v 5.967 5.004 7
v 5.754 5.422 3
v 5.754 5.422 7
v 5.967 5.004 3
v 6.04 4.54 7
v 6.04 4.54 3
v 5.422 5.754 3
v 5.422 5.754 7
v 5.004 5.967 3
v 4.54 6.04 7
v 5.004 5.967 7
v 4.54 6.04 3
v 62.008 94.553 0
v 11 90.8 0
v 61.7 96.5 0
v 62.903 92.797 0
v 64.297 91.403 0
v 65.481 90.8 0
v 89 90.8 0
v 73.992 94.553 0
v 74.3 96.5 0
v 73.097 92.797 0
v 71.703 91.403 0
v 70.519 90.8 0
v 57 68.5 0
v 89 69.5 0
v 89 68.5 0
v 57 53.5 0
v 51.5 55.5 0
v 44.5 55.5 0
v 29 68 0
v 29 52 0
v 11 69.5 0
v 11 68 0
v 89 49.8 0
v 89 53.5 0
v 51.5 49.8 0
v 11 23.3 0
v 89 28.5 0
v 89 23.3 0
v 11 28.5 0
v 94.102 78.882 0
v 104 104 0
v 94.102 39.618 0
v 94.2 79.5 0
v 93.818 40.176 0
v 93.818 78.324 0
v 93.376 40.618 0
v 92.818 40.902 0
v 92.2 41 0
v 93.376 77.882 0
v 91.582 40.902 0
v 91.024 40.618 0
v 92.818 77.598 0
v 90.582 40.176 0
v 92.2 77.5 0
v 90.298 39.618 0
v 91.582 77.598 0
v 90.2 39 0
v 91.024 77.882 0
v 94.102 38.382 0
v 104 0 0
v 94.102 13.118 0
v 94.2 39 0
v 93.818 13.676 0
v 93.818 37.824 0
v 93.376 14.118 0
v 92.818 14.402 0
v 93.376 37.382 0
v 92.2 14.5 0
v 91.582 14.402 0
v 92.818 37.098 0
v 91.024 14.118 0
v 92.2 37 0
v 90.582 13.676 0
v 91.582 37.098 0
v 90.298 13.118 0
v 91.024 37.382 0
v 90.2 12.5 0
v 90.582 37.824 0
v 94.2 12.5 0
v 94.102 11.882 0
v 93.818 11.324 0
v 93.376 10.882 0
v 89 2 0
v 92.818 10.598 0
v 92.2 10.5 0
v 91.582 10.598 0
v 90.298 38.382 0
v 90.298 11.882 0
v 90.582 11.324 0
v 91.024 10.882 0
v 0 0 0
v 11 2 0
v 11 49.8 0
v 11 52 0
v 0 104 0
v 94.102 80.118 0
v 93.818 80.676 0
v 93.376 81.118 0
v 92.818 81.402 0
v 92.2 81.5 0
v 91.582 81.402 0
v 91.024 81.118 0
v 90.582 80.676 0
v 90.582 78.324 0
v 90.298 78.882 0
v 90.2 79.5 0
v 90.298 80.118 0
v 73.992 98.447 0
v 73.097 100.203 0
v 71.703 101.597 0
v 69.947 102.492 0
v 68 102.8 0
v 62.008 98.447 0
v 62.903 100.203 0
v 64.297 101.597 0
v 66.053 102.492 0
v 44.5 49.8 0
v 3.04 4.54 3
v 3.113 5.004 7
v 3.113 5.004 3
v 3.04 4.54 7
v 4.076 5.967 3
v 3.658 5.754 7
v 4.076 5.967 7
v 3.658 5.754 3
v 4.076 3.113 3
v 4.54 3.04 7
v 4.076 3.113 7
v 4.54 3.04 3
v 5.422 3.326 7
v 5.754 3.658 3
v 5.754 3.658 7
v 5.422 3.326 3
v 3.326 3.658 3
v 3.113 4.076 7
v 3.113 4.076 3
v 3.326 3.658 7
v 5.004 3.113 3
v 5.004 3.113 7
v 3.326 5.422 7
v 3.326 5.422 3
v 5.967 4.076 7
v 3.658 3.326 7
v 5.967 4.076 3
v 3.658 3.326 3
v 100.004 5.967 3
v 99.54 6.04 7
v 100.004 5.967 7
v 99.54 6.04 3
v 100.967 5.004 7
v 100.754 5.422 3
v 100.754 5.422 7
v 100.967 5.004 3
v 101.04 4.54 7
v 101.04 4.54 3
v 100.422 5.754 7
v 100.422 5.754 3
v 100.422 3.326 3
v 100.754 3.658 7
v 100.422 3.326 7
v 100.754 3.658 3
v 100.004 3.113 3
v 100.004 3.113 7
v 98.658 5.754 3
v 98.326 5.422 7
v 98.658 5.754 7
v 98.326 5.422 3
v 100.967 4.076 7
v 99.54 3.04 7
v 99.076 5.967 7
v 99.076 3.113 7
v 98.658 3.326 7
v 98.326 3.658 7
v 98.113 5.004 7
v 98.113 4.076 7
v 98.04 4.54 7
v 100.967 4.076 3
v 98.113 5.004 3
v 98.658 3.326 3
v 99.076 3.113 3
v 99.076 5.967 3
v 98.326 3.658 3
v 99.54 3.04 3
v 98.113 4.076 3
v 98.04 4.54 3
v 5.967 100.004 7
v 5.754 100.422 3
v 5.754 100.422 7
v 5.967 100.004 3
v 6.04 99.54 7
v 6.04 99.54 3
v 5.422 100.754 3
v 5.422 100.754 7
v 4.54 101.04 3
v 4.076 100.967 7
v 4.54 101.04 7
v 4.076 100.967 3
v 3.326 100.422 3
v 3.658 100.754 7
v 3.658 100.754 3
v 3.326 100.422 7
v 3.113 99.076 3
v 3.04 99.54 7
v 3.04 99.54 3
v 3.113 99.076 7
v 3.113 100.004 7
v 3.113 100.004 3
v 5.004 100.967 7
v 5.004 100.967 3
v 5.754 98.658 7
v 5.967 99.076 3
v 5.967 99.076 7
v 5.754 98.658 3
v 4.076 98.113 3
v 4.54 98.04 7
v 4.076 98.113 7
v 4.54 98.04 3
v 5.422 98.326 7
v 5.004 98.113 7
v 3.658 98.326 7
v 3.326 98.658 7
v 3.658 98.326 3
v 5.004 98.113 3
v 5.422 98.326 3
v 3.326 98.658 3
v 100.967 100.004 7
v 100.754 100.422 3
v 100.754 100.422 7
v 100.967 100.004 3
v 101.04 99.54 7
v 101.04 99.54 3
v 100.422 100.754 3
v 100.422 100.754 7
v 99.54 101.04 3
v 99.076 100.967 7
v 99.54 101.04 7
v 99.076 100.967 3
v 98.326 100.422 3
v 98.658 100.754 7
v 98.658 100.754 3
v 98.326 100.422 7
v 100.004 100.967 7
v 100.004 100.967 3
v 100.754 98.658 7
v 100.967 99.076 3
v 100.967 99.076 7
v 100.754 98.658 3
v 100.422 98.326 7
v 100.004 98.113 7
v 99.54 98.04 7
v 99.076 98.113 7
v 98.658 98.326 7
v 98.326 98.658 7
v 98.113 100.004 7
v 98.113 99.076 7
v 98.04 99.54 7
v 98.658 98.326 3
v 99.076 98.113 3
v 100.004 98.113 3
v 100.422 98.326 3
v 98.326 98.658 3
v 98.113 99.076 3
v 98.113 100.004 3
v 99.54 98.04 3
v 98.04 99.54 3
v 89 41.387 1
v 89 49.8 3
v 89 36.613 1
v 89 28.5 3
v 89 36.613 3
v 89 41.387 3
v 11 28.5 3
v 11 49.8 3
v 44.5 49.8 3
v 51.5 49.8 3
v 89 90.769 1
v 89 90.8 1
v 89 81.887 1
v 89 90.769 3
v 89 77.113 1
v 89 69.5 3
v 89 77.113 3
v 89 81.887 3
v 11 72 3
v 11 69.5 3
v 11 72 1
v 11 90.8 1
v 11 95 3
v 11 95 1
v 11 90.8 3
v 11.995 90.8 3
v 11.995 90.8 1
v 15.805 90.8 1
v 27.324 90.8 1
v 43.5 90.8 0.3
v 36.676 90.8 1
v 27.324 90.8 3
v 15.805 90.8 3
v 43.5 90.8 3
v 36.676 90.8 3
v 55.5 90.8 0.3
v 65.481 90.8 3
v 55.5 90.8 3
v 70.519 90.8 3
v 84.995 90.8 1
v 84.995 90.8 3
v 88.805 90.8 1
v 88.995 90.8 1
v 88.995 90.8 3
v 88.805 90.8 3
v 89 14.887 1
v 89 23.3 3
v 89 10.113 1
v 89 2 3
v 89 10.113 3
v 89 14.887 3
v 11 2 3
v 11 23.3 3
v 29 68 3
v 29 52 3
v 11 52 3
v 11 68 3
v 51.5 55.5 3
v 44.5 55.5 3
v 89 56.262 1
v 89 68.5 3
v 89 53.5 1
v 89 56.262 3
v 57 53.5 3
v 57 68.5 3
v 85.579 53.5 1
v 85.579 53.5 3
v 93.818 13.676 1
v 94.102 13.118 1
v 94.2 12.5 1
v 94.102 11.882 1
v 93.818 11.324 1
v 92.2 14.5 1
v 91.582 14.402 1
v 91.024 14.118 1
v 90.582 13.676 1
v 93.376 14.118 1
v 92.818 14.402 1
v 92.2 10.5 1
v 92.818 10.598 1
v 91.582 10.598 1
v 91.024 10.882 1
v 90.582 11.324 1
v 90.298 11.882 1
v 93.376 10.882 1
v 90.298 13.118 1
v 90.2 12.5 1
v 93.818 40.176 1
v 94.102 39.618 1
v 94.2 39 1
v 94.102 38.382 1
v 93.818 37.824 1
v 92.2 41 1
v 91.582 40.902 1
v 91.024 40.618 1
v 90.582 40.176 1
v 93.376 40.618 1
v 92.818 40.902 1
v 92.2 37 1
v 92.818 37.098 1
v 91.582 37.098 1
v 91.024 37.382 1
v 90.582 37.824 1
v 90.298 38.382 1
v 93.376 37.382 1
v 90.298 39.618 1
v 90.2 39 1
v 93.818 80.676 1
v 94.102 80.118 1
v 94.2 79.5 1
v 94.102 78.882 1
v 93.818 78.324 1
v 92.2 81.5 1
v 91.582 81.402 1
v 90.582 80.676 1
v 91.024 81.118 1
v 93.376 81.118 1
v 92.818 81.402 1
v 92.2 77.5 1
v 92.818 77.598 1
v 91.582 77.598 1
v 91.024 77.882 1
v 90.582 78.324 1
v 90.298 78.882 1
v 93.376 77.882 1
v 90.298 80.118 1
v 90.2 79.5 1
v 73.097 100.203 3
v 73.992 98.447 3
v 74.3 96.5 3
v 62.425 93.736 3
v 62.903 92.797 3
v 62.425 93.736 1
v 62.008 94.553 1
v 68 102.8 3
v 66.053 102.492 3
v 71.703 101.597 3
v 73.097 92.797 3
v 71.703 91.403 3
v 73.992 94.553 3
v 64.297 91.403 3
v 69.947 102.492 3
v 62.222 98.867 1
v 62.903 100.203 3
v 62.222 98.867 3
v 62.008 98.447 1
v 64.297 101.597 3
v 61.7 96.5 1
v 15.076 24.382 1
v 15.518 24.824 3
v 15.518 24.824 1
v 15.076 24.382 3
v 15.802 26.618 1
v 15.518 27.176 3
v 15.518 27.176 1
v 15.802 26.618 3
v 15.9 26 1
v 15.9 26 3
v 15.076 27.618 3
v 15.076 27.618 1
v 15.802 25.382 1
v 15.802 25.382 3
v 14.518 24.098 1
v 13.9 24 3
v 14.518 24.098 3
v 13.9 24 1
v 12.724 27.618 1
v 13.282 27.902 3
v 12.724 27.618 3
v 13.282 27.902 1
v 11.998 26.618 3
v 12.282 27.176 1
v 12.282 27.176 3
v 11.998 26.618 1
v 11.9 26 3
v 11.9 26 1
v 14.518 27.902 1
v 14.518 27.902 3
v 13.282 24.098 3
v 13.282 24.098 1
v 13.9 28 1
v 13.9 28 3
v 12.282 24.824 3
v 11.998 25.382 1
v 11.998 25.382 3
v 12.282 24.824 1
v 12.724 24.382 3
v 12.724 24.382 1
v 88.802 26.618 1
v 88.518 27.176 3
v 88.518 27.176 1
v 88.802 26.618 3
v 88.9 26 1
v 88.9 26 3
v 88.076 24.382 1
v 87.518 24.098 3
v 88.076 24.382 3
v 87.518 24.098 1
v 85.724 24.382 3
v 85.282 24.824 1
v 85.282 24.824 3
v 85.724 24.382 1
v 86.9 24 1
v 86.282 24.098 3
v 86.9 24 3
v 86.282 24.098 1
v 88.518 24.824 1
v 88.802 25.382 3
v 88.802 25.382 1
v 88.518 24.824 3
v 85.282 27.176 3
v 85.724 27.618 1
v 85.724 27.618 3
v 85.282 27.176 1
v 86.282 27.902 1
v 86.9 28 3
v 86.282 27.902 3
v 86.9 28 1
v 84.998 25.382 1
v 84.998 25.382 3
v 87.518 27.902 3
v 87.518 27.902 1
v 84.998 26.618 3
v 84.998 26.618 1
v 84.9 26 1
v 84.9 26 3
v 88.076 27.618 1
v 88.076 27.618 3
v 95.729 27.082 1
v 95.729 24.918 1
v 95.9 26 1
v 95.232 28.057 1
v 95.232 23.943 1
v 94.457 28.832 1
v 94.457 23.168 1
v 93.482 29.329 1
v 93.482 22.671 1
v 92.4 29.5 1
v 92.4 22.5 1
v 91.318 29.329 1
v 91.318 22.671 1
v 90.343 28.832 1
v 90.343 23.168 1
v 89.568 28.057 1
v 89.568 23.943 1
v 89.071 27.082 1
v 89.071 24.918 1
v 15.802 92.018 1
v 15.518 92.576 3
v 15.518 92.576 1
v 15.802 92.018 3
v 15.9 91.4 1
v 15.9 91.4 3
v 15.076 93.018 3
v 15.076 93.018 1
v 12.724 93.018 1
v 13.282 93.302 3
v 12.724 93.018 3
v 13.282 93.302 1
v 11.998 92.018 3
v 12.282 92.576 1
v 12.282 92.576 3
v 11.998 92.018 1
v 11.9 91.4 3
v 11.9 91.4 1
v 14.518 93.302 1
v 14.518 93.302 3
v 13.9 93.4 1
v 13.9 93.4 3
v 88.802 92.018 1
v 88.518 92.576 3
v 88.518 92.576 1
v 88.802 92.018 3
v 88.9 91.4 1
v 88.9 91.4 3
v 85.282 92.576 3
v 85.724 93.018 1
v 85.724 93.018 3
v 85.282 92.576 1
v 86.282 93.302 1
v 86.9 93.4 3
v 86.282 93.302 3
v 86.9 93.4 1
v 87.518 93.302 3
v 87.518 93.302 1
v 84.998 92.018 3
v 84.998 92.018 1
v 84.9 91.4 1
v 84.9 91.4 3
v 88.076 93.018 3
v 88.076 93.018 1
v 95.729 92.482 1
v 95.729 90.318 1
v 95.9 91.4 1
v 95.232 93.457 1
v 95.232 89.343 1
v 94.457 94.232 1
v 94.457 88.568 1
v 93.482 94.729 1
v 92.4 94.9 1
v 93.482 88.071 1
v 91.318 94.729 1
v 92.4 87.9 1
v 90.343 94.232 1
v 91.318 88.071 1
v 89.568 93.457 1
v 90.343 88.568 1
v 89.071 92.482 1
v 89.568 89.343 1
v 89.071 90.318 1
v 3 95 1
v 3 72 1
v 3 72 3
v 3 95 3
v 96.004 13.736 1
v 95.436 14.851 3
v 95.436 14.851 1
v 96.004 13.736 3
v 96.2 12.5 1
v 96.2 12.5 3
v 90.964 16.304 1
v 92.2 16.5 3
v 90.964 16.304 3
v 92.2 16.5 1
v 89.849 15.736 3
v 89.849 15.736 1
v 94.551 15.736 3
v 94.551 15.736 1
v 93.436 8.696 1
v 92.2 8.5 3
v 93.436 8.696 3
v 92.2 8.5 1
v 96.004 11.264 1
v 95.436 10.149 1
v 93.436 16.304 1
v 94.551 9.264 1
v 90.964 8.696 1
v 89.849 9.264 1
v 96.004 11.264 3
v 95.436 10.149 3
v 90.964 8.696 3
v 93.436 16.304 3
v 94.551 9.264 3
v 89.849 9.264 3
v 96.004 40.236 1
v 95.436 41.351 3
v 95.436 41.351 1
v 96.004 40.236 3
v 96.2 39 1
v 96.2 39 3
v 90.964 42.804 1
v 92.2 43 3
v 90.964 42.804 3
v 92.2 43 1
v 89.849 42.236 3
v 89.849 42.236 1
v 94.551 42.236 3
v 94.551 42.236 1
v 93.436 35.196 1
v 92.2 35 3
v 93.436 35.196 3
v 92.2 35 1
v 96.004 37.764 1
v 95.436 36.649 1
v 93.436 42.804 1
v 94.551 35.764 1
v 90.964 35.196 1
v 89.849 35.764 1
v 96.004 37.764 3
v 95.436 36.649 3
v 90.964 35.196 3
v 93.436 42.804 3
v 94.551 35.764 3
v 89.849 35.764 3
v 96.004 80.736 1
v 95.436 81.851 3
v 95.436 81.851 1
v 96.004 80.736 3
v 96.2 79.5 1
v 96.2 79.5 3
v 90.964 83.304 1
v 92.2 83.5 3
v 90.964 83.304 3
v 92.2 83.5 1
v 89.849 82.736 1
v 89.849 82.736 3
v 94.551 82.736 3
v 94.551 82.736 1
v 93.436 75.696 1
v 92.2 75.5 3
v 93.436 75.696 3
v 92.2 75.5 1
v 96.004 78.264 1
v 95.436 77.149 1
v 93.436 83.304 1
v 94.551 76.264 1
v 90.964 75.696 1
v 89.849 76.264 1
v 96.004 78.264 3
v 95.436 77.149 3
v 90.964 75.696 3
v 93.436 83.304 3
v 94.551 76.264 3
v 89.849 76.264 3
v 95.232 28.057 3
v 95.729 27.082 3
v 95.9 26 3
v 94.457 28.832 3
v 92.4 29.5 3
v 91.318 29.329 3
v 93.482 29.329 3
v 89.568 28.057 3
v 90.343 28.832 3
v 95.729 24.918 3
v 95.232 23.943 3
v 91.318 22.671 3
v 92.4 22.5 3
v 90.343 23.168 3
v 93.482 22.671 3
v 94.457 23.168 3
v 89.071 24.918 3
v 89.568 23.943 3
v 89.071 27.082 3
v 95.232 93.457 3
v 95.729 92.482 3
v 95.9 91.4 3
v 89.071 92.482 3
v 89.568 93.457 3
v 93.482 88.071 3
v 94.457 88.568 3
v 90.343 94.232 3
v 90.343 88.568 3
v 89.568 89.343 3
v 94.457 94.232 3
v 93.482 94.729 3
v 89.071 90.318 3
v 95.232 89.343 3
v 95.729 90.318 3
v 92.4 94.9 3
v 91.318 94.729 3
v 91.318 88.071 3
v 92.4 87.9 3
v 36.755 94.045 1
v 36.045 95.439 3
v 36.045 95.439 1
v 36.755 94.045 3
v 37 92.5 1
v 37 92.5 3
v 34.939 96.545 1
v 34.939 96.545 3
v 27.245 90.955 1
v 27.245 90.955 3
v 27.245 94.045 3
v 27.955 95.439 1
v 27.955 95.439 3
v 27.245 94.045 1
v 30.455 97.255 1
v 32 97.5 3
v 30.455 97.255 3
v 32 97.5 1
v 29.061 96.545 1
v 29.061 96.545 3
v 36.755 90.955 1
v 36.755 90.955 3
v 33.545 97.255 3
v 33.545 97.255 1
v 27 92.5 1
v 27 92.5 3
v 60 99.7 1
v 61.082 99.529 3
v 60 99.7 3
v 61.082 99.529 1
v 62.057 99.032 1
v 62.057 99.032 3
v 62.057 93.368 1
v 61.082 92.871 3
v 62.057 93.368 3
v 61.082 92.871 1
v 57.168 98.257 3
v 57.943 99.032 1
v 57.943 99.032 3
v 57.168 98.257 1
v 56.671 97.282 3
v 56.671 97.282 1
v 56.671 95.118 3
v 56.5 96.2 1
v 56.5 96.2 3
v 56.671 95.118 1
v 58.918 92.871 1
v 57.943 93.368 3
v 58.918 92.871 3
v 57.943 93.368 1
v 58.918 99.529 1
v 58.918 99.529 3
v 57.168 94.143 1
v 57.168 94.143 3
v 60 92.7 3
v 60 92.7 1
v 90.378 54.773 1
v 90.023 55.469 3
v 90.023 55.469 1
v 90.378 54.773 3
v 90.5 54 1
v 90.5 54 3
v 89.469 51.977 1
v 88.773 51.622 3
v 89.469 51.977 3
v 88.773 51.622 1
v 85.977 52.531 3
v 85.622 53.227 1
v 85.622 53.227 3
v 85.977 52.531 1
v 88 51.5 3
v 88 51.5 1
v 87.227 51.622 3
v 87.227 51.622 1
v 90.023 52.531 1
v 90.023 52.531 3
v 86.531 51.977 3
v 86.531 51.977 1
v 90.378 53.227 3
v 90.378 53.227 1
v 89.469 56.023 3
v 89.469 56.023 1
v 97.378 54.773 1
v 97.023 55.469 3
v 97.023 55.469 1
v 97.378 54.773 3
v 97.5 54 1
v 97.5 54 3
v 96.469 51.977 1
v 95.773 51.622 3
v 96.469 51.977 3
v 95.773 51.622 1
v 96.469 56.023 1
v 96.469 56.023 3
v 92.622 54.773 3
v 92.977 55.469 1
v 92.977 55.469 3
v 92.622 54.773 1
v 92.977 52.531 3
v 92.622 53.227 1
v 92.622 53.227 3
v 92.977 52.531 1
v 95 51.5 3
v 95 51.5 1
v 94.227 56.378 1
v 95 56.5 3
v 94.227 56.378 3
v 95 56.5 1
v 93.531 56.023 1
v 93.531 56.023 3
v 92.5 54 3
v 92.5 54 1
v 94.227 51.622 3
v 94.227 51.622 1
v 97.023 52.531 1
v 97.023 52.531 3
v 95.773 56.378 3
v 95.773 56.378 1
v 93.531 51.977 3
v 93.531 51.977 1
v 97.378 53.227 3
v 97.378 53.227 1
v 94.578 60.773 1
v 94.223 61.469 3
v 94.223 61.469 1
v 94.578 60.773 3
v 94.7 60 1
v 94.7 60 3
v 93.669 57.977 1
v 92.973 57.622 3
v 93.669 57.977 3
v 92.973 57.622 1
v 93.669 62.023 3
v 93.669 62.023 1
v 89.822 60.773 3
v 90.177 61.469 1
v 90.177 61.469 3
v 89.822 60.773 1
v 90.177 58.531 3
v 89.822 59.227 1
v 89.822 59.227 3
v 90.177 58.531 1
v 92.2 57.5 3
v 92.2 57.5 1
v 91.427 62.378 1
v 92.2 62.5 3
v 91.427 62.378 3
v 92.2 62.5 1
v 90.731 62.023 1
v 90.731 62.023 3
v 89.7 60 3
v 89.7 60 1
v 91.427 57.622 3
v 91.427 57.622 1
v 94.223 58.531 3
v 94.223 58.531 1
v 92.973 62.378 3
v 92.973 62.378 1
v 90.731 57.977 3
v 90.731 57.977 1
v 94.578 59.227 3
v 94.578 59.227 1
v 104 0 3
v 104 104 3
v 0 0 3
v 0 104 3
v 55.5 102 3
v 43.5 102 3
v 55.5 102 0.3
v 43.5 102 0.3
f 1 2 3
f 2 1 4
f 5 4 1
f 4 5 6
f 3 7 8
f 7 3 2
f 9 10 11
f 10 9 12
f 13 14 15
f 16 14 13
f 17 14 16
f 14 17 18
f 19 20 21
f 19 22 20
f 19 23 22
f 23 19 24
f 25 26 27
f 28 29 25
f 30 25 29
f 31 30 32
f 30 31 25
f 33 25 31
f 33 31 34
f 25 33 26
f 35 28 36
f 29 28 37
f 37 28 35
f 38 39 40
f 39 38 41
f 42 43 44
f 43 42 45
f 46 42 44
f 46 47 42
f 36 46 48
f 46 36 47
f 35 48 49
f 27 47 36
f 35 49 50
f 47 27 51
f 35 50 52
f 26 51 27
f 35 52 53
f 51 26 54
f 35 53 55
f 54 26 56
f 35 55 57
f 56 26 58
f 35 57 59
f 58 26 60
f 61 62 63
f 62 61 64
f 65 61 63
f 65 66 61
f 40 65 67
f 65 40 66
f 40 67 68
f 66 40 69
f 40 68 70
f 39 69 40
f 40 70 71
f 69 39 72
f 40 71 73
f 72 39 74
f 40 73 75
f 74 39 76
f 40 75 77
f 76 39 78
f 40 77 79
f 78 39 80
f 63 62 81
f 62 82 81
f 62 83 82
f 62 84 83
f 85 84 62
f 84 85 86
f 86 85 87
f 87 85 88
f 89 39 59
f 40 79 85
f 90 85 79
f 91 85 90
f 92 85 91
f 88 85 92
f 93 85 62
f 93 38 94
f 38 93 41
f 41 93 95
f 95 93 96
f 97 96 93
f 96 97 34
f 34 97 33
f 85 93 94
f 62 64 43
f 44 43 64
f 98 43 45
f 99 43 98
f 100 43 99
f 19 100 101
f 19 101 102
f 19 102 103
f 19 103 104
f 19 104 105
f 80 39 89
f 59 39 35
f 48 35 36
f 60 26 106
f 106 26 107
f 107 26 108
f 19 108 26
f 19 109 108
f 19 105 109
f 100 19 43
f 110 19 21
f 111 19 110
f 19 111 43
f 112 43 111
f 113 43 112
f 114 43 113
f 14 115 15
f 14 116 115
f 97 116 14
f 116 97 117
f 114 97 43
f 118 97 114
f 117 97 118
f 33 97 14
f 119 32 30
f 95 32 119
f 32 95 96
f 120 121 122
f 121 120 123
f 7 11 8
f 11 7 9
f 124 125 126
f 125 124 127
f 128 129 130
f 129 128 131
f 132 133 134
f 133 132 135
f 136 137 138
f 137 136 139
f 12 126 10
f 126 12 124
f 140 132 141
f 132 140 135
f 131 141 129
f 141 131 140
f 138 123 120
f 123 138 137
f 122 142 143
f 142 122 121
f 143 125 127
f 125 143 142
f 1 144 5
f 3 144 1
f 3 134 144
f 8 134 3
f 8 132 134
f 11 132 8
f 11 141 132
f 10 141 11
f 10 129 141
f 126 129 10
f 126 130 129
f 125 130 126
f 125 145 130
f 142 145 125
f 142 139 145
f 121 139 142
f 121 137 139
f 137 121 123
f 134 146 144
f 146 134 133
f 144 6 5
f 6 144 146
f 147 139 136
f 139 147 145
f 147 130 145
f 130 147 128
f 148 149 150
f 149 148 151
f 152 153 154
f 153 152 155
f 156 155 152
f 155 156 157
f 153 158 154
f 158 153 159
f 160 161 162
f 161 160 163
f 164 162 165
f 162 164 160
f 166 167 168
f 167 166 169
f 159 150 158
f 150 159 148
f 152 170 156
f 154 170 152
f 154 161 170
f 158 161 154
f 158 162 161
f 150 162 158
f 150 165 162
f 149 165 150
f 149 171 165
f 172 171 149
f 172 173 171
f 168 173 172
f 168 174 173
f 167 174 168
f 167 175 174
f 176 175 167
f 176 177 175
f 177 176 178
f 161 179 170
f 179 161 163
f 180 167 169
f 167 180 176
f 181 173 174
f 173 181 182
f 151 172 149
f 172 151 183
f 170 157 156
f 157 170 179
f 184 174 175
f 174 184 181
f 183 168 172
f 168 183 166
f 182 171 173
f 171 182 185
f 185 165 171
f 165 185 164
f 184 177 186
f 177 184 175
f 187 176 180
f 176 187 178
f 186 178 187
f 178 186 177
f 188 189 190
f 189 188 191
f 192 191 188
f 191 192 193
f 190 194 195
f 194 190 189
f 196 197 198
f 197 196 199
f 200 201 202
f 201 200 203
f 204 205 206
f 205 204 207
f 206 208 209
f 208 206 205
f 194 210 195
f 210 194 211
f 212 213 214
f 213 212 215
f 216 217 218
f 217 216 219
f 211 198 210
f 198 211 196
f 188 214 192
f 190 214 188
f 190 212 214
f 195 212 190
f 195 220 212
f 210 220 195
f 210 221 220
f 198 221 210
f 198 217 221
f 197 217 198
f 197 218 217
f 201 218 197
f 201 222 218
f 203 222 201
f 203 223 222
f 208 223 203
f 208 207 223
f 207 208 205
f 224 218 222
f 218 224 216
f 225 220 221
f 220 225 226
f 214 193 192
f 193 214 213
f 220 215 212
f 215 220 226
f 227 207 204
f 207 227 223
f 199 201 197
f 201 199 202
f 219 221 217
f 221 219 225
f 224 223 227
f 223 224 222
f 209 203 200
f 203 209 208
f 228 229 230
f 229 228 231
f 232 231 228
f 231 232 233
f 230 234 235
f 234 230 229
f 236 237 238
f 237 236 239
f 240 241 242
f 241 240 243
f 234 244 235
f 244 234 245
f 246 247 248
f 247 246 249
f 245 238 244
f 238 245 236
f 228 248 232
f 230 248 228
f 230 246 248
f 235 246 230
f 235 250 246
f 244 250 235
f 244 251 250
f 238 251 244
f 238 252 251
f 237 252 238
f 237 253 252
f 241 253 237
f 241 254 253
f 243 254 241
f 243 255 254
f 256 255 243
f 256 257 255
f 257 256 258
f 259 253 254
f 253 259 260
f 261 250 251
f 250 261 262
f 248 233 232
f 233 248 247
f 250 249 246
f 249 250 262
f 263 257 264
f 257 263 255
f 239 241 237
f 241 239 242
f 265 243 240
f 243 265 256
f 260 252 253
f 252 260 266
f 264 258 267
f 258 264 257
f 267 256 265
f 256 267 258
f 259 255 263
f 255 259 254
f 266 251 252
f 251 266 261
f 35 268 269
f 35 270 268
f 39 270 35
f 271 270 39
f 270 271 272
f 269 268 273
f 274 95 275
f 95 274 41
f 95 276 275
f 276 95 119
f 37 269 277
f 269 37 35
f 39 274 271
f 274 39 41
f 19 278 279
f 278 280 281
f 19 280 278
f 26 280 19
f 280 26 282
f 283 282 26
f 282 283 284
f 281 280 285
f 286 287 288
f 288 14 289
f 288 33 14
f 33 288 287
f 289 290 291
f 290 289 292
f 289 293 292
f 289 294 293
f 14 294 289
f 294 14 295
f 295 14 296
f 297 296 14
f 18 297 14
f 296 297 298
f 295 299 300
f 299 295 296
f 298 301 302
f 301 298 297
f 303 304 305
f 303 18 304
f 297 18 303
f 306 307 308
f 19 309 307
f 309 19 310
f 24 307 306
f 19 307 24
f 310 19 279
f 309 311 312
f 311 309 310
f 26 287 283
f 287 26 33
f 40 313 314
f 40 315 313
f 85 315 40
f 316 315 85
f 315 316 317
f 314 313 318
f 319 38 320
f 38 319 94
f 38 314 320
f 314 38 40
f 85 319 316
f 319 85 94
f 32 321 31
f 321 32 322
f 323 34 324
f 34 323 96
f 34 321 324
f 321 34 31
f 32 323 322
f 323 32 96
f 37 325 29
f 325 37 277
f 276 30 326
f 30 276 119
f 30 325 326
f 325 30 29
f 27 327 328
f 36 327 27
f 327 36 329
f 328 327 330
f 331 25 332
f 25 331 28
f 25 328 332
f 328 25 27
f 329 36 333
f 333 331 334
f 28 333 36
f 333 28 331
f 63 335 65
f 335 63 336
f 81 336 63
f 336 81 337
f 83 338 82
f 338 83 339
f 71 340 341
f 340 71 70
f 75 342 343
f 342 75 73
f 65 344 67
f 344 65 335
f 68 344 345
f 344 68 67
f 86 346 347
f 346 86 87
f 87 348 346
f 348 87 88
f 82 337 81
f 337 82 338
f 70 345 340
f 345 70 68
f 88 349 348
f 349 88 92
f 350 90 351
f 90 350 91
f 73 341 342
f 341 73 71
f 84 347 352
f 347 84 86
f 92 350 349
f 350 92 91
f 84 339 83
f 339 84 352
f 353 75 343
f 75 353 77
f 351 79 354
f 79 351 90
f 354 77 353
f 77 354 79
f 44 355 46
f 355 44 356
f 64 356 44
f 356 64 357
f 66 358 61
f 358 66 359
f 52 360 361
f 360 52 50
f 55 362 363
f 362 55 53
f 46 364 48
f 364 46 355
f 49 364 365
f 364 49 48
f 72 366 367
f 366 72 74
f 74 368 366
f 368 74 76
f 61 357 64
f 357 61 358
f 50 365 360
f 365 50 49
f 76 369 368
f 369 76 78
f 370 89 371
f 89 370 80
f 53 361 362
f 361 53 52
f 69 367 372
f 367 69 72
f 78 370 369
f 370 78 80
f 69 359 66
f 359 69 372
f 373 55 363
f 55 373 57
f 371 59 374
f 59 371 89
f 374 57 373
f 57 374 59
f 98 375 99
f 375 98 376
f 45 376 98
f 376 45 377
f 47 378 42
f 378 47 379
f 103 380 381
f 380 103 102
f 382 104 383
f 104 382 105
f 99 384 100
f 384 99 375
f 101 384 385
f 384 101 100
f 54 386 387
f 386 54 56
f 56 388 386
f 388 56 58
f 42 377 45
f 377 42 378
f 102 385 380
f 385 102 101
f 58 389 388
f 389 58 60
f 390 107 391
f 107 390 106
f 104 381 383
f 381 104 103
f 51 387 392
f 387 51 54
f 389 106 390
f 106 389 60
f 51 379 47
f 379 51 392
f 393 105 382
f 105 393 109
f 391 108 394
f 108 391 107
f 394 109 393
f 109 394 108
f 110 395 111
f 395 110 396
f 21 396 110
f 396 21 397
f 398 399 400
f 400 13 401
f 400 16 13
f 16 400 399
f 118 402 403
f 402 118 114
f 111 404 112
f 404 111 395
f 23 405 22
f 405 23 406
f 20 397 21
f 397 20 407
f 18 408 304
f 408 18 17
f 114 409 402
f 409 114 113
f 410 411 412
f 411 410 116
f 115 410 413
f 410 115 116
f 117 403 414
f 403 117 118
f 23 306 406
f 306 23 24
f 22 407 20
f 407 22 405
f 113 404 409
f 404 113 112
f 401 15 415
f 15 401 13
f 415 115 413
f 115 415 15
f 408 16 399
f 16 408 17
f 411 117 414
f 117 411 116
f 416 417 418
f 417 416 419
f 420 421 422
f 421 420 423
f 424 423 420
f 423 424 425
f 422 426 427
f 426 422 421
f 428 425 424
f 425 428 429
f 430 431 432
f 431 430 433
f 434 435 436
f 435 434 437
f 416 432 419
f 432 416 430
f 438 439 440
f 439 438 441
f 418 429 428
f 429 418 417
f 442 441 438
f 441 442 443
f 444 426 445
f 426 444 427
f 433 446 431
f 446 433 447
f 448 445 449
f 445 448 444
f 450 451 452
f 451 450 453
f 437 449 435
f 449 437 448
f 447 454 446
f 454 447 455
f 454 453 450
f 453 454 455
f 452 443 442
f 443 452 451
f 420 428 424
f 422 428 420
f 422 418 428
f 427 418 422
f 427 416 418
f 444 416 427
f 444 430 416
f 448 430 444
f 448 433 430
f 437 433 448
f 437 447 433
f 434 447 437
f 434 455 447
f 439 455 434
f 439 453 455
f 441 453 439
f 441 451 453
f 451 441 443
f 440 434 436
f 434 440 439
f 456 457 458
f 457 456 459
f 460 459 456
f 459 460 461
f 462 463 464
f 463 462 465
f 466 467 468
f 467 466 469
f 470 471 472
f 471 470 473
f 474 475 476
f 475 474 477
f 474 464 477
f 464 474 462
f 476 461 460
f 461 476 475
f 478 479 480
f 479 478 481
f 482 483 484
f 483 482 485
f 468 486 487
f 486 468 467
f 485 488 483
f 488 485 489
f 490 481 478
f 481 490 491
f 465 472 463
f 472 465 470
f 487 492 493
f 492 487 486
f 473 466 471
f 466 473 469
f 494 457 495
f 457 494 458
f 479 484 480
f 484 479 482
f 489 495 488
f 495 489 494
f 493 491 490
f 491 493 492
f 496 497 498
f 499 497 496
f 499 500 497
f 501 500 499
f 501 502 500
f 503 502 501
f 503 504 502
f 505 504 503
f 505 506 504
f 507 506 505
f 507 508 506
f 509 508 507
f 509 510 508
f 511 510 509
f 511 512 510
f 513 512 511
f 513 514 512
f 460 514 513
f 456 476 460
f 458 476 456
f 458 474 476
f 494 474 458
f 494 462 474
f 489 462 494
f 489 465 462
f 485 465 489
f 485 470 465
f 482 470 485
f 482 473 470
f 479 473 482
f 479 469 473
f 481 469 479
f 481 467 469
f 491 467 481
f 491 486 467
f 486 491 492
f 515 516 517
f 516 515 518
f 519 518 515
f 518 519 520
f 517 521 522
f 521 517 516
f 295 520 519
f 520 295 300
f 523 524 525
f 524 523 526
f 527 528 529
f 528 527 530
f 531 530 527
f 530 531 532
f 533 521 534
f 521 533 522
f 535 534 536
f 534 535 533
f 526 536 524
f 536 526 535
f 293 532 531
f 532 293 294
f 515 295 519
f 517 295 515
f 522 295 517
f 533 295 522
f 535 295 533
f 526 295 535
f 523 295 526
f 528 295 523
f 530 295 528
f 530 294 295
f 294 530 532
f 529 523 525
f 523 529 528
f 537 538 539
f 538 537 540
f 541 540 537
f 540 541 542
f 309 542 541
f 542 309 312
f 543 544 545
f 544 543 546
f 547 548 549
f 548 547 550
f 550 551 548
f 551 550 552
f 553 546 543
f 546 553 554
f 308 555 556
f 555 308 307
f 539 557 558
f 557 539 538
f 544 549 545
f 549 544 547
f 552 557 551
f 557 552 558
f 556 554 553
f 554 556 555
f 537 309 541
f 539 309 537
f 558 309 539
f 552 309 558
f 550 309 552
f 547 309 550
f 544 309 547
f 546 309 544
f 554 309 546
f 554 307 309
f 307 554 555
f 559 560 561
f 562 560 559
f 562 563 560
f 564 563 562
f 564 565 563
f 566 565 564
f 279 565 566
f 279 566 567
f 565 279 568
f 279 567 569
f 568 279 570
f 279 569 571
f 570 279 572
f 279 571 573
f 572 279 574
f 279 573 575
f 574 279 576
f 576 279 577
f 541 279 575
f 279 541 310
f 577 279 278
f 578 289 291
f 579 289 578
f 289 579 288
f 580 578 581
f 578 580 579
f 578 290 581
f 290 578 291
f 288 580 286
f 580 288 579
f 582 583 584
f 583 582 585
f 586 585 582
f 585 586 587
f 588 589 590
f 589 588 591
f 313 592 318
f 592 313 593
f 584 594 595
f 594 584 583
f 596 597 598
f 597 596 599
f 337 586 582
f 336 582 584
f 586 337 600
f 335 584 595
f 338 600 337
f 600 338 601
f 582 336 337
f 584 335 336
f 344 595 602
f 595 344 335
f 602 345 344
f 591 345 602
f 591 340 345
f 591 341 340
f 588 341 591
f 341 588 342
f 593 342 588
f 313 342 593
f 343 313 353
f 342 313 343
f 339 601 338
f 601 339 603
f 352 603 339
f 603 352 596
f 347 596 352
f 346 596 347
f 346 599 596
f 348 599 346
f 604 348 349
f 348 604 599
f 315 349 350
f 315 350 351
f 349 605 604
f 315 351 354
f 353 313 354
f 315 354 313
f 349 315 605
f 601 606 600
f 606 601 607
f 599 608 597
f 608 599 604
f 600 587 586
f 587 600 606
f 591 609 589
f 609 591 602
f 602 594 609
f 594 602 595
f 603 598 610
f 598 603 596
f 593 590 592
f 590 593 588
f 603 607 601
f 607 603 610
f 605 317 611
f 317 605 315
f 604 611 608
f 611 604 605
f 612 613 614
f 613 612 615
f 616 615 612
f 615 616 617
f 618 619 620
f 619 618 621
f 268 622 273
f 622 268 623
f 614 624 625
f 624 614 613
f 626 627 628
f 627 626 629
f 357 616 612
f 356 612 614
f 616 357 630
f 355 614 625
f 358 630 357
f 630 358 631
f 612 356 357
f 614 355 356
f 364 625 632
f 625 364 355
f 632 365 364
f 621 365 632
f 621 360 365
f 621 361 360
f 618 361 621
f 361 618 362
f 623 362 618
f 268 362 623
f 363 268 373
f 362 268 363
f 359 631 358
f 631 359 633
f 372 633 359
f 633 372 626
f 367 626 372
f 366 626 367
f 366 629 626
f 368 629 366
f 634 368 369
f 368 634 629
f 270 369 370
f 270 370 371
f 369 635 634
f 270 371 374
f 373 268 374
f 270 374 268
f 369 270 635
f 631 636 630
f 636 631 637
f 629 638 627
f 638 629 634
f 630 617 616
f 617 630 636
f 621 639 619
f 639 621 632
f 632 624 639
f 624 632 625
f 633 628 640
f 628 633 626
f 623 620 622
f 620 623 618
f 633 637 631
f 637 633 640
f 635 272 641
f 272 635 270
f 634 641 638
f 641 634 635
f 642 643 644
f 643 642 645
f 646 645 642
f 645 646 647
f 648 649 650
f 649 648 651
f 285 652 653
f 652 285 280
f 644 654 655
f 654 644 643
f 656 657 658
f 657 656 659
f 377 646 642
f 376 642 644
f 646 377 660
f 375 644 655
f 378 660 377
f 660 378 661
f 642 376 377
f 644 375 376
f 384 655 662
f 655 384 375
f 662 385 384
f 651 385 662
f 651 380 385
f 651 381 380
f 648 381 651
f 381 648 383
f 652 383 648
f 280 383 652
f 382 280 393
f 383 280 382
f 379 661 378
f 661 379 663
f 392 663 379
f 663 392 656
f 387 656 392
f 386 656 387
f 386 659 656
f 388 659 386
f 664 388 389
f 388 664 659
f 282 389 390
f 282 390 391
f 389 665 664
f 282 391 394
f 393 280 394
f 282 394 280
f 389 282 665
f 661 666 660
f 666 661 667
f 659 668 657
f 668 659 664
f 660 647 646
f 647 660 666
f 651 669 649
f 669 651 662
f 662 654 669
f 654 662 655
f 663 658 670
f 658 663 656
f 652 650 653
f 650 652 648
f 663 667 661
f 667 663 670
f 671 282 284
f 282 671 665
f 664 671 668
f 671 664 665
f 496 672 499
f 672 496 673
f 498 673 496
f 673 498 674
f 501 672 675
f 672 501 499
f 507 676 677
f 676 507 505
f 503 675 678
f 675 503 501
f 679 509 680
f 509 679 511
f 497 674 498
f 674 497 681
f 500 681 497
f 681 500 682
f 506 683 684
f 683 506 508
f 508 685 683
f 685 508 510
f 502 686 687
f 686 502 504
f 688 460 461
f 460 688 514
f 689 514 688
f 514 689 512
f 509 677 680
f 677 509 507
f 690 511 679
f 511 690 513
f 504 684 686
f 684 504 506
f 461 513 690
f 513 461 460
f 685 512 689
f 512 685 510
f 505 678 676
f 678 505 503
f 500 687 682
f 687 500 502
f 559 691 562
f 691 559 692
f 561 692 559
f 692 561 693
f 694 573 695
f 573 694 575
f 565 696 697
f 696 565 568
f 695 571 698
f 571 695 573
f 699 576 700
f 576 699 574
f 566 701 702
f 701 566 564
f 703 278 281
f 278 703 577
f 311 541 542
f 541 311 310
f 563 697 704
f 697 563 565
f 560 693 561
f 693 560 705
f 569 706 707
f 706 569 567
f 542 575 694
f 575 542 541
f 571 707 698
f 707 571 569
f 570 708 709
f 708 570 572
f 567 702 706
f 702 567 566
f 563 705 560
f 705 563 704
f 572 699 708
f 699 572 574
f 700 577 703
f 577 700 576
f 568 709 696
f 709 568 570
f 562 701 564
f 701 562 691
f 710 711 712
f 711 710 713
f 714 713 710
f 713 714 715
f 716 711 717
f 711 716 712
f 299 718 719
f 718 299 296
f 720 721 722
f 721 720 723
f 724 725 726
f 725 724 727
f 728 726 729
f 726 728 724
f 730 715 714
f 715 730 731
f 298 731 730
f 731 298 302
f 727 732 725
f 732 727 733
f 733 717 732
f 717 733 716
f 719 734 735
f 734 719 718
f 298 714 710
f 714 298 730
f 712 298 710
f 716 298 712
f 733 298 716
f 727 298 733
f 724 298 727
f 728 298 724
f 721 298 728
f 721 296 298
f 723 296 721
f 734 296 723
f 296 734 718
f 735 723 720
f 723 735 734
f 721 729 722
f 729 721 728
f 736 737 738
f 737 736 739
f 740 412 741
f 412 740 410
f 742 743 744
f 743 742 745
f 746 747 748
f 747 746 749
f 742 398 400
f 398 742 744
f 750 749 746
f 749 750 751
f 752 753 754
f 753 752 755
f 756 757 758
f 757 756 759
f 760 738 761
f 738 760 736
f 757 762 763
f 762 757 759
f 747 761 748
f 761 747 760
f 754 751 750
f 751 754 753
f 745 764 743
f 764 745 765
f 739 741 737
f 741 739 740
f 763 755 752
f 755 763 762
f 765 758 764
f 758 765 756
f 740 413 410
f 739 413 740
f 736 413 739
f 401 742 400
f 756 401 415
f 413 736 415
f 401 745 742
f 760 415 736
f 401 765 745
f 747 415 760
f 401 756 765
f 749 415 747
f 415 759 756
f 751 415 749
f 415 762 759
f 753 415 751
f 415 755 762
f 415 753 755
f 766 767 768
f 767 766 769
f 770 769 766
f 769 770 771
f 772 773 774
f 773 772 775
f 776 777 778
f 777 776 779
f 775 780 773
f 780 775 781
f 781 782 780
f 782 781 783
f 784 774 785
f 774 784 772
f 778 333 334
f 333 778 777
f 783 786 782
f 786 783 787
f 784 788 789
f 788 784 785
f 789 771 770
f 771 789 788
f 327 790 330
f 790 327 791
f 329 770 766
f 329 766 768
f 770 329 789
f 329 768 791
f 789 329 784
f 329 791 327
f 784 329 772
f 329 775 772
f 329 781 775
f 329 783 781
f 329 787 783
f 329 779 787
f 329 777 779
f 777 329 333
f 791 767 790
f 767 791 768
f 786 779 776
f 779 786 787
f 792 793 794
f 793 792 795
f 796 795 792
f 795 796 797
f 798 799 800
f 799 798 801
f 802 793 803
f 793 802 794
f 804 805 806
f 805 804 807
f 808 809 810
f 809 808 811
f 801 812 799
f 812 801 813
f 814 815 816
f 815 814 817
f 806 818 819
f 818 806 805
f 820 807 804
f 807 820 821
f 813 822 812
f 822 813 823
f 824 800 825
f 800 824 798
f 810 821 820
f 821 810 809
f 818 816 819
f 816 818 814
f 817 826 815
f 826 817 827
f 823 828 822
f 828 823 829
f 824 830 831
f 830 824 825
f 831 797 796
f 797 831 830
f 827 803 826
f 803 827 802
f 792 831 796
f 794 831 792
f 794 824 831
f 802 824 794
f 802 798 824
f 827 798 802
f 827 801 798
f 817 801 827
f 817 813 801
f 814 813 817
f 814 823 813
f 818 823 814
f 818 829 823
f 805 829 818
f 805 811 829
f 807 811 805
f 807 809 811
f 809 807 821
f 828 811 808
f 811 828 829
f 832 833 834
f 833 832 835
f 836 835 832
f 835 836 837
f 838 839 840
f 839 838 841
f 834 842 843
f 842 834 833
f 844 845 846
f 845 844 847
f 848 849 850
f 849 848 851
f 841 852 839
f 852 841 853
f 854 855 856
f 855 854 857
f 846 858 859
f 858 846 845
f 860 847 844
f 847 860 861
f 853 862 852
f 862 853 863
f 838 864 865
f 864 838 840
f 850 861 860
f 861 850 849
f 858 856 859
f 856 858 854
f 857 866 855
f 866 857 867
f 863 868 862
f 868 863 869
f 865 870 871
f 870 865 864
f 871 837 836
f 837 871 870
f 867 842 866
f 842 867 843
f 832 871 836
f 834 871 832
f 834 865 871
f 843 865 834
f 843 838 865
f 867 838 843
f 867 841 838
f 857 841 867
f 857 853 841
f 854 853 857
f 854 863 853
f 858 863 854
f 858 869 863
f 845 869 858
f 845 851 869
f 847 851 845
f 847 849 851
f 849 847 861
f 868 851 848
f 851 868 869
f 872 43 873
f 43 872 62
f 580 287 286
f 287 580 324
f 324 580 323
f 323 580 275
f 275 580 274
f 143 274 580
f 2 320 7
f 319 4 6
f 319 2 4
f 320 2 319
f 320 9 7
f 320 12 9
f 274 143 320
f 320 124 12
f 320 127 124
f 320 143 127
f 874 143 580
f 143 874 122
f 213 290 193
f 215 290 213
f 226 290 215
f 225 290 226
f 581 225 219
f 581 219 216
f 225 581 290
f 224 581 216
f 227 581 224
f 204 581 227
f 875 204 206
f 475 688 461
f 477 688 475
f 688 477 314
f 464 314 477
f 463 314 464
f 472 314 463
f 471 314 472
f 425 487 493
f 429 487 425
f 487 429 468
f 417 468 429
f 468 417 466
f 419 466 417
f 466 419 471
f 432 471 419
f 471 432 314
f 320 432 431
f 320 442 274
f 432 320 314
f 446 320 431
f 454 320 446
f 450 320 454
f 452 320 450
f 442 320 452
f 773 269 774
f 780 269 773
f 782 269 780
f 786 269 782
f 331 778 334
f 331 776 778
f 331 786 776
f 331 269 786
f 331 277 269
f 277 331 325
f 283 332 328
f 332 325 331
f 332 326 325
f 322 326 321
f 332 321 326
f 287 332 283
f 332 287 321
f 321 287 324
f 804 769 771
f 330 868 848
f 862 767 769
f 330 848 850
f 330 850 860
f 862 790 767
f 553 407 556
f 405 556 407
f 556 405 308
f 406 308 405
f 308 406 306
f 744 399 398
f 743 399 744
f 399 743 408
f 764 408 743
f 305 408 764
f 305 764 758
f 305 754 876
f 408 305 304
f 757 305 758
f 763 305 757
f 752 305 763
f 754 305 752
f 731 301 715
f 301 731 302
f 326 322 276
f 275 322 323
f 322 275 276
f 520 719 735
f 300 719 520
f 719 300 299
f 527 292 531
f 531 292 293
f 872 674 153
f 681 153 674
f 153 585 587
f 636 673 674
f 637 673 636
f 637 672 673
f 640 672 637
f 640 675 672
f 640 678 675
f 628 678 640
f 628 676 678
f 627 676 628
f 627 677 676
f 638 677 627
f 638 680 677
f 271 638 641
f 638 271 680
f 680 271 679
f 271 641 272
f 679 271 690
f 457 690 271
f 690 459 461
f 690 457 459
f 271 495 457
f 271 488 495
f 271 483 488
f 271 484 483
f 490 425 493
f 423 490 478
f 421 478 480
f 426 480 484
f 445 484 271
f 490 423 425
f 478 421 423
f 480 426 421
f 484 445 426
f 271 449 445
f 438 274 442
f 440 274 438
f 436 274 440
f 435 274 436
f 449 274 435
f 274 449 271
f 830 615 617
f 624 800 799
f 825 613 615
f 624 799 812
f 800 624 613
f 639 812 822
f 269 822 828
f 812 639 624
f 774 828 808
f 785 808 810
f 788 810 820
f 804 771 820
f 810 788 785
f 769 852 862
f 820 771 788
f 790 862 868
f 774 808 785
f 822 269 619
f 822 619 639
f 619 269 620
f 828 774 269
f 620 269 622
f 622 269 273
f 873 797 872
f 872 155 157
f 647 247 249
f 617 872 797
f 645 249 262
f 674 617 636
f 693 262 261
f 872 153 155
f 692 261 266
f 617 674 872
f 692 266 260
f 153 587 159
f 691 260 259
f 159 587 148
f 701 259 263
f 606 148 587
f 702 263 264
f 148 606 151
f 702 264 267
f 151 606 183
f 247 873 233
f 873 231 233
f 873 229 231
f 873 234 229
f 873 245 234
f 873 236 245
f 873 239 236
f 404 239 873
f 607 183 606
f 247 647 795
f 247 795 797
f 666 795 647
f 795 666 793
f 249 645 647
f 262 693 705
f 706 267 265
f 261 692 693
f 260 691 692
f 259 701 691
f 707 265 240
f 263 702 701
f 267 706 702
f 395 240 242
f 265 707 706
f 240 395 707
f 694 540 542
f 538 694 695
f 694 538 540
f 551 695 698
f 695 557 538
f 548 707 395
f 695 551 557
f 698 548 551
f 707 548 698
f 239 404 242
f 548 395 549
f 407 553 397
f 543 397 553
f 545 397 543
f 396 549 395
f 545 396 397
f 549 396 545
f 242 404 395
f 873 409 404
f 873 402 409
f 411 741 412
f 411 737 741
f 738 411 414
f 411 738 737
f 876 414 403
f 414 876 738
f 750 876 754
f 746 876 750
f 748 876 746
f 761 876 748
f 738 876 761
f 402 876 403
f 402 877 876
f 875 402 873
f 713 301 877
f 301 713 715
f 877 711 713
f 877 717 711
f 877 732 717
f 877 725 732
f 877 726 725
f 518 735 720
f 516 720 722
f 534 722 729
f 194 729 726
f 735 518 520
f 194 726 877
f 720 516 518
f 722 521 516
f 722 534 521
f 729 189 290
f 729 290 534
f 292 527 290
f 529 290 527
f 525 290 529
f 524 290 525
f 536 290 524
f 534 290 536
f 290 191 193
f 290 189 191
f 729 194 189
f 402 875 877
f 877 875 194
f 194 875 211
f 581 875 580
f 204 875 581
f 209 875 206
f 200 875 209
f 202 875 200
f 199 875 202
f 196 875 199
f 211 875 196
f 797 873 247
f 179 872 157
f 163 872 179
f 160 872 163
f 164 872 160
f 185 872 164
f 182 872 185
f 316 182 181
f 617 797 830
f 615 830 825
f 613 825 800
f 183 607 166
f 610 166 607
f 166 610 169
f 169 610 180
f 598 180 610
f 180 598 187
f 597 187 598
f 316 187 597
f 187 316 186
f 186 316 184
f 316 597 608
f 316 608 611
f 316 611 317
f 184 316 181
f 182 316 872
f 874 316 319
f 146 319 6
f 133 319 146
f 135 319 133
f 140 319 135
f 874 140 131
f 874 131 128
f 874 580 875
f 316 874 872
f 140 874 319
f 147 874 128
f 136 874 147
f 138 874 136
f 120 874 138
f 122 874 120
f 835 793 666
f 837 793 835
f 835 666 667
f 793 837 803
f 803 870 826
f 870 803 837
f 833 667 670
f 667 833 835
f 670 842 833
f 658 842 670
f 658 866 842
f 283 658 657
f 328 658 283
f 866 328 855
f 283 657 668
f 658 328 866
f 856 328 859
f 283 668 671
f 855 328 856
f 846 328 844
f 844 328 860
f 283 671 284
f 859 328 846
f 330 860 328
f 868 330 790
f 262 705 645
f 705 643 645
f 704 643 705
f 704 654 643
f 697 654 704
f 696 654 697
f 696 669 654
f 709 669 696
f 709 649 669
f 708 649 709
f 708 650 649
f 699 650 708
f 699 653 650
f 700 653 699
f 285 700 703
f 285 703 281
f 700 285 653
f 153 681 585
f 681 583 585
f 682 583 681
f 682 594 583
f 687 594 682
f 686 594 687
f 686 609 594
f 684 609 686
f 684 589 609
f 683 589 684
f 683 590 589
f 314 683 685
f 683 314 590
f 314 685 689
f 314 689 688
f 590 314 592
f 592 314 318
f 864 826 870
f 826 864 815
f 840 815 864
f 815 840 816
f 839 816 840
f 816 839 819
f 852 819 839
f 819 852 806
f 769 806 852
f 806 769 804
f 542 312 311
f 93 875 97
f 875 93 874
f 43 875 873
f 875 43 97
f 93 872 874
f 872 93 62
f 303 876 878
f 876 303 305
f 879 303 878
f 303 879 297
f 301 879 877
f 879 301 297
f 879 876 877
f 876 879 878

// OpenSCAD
$fn=20;
pcbx=100;
pcby=100;
bh=2;

translate([bh,bh,0])
translate([2.54,2.54,0]) {
 cylinder(h=7,r=1.5);
translate([95,0,0]) 
 cylinder(h=7,r=1.5);
translate([0,95,0]) 
 cylinder(h=7,r=1.5);
translate([95,95,0]) 
 cylinder(h=7,r=1.5);
}
difference(){
cube([pcbx+bh+bh,pcby+bh+bh,3]);
translate([bh,bh,0]) {


translate([9,26.5,0]) cube([78,21.3,4]); //B3
translate([9,67.5,0]) cube([78,21.3,4]); //B4
translate([9,0,0]) cube([78,21.3,4]);  //b5
translate([9,50,0]) cube([18,16,4]);   //label
translate([46,50,0]) cube([7,7,4*2],true);  // reset switch  y=50
translate([55,51.5,0]) cube([32,15,4]);  //usbcom

translate([90.2,10.5,0]) cylinder(h=4,r=2);//led3
translate([90.2,37,0]) cylinder(h=4,r=2);//led4
translate([90.2,77.5,0]) cylinder(h=4,r=2);//led5

translate([66,94.5,0]) cylinder(h=4,r=6.3);//bat
}
translate([bh,bh,0.3]){
translate([41.5,88,0]) cube([12,12,4]);//U9
}
translate([bh,bh,1]){
translate([1,70,0]) cube([8,23,4]); //s2 s3
translate([90.2,10.5,0]) cylinder(h=4,r=4);//led3
translate([90.2,37,0]) cylinder(h=4,r=4);//led4
translate([90.2,77.5,0]) cylinder(h=4,r=4);//led5

translate([11.9,100-76,0])  {
cylinder(h=4,r=2);//B2
translate([73,0,0]) cylinder(h=4,r=2);//B2
}

translate([11.9,100-10.6,0])  {
cylinder(h=4,r=2);//B1
translate([73,0,0]) cylinder(h=4,r=2);//B1
}

translate([90.4,100-76,0]) cylinder(h=4,r=3.5);//led2
translate([90.4,100-10.6,0]) cylinder(h=4,r=3.5);//led1

translate([30,100-9.5,0]) cylinder(h=4,r=5);//r24,r3

translate([58,100-5.8,0]) cylinder(h=4,r=3.5);//d1

translate([86,100-48,0]) cylinder(h=4,r=2.5);//power
translate([93,100-48,0]) cylinder(h=4,r=2.5);//power
translate([90.2,100-42,0]) cylinder(h=4,r=2.5);//power
}
}
